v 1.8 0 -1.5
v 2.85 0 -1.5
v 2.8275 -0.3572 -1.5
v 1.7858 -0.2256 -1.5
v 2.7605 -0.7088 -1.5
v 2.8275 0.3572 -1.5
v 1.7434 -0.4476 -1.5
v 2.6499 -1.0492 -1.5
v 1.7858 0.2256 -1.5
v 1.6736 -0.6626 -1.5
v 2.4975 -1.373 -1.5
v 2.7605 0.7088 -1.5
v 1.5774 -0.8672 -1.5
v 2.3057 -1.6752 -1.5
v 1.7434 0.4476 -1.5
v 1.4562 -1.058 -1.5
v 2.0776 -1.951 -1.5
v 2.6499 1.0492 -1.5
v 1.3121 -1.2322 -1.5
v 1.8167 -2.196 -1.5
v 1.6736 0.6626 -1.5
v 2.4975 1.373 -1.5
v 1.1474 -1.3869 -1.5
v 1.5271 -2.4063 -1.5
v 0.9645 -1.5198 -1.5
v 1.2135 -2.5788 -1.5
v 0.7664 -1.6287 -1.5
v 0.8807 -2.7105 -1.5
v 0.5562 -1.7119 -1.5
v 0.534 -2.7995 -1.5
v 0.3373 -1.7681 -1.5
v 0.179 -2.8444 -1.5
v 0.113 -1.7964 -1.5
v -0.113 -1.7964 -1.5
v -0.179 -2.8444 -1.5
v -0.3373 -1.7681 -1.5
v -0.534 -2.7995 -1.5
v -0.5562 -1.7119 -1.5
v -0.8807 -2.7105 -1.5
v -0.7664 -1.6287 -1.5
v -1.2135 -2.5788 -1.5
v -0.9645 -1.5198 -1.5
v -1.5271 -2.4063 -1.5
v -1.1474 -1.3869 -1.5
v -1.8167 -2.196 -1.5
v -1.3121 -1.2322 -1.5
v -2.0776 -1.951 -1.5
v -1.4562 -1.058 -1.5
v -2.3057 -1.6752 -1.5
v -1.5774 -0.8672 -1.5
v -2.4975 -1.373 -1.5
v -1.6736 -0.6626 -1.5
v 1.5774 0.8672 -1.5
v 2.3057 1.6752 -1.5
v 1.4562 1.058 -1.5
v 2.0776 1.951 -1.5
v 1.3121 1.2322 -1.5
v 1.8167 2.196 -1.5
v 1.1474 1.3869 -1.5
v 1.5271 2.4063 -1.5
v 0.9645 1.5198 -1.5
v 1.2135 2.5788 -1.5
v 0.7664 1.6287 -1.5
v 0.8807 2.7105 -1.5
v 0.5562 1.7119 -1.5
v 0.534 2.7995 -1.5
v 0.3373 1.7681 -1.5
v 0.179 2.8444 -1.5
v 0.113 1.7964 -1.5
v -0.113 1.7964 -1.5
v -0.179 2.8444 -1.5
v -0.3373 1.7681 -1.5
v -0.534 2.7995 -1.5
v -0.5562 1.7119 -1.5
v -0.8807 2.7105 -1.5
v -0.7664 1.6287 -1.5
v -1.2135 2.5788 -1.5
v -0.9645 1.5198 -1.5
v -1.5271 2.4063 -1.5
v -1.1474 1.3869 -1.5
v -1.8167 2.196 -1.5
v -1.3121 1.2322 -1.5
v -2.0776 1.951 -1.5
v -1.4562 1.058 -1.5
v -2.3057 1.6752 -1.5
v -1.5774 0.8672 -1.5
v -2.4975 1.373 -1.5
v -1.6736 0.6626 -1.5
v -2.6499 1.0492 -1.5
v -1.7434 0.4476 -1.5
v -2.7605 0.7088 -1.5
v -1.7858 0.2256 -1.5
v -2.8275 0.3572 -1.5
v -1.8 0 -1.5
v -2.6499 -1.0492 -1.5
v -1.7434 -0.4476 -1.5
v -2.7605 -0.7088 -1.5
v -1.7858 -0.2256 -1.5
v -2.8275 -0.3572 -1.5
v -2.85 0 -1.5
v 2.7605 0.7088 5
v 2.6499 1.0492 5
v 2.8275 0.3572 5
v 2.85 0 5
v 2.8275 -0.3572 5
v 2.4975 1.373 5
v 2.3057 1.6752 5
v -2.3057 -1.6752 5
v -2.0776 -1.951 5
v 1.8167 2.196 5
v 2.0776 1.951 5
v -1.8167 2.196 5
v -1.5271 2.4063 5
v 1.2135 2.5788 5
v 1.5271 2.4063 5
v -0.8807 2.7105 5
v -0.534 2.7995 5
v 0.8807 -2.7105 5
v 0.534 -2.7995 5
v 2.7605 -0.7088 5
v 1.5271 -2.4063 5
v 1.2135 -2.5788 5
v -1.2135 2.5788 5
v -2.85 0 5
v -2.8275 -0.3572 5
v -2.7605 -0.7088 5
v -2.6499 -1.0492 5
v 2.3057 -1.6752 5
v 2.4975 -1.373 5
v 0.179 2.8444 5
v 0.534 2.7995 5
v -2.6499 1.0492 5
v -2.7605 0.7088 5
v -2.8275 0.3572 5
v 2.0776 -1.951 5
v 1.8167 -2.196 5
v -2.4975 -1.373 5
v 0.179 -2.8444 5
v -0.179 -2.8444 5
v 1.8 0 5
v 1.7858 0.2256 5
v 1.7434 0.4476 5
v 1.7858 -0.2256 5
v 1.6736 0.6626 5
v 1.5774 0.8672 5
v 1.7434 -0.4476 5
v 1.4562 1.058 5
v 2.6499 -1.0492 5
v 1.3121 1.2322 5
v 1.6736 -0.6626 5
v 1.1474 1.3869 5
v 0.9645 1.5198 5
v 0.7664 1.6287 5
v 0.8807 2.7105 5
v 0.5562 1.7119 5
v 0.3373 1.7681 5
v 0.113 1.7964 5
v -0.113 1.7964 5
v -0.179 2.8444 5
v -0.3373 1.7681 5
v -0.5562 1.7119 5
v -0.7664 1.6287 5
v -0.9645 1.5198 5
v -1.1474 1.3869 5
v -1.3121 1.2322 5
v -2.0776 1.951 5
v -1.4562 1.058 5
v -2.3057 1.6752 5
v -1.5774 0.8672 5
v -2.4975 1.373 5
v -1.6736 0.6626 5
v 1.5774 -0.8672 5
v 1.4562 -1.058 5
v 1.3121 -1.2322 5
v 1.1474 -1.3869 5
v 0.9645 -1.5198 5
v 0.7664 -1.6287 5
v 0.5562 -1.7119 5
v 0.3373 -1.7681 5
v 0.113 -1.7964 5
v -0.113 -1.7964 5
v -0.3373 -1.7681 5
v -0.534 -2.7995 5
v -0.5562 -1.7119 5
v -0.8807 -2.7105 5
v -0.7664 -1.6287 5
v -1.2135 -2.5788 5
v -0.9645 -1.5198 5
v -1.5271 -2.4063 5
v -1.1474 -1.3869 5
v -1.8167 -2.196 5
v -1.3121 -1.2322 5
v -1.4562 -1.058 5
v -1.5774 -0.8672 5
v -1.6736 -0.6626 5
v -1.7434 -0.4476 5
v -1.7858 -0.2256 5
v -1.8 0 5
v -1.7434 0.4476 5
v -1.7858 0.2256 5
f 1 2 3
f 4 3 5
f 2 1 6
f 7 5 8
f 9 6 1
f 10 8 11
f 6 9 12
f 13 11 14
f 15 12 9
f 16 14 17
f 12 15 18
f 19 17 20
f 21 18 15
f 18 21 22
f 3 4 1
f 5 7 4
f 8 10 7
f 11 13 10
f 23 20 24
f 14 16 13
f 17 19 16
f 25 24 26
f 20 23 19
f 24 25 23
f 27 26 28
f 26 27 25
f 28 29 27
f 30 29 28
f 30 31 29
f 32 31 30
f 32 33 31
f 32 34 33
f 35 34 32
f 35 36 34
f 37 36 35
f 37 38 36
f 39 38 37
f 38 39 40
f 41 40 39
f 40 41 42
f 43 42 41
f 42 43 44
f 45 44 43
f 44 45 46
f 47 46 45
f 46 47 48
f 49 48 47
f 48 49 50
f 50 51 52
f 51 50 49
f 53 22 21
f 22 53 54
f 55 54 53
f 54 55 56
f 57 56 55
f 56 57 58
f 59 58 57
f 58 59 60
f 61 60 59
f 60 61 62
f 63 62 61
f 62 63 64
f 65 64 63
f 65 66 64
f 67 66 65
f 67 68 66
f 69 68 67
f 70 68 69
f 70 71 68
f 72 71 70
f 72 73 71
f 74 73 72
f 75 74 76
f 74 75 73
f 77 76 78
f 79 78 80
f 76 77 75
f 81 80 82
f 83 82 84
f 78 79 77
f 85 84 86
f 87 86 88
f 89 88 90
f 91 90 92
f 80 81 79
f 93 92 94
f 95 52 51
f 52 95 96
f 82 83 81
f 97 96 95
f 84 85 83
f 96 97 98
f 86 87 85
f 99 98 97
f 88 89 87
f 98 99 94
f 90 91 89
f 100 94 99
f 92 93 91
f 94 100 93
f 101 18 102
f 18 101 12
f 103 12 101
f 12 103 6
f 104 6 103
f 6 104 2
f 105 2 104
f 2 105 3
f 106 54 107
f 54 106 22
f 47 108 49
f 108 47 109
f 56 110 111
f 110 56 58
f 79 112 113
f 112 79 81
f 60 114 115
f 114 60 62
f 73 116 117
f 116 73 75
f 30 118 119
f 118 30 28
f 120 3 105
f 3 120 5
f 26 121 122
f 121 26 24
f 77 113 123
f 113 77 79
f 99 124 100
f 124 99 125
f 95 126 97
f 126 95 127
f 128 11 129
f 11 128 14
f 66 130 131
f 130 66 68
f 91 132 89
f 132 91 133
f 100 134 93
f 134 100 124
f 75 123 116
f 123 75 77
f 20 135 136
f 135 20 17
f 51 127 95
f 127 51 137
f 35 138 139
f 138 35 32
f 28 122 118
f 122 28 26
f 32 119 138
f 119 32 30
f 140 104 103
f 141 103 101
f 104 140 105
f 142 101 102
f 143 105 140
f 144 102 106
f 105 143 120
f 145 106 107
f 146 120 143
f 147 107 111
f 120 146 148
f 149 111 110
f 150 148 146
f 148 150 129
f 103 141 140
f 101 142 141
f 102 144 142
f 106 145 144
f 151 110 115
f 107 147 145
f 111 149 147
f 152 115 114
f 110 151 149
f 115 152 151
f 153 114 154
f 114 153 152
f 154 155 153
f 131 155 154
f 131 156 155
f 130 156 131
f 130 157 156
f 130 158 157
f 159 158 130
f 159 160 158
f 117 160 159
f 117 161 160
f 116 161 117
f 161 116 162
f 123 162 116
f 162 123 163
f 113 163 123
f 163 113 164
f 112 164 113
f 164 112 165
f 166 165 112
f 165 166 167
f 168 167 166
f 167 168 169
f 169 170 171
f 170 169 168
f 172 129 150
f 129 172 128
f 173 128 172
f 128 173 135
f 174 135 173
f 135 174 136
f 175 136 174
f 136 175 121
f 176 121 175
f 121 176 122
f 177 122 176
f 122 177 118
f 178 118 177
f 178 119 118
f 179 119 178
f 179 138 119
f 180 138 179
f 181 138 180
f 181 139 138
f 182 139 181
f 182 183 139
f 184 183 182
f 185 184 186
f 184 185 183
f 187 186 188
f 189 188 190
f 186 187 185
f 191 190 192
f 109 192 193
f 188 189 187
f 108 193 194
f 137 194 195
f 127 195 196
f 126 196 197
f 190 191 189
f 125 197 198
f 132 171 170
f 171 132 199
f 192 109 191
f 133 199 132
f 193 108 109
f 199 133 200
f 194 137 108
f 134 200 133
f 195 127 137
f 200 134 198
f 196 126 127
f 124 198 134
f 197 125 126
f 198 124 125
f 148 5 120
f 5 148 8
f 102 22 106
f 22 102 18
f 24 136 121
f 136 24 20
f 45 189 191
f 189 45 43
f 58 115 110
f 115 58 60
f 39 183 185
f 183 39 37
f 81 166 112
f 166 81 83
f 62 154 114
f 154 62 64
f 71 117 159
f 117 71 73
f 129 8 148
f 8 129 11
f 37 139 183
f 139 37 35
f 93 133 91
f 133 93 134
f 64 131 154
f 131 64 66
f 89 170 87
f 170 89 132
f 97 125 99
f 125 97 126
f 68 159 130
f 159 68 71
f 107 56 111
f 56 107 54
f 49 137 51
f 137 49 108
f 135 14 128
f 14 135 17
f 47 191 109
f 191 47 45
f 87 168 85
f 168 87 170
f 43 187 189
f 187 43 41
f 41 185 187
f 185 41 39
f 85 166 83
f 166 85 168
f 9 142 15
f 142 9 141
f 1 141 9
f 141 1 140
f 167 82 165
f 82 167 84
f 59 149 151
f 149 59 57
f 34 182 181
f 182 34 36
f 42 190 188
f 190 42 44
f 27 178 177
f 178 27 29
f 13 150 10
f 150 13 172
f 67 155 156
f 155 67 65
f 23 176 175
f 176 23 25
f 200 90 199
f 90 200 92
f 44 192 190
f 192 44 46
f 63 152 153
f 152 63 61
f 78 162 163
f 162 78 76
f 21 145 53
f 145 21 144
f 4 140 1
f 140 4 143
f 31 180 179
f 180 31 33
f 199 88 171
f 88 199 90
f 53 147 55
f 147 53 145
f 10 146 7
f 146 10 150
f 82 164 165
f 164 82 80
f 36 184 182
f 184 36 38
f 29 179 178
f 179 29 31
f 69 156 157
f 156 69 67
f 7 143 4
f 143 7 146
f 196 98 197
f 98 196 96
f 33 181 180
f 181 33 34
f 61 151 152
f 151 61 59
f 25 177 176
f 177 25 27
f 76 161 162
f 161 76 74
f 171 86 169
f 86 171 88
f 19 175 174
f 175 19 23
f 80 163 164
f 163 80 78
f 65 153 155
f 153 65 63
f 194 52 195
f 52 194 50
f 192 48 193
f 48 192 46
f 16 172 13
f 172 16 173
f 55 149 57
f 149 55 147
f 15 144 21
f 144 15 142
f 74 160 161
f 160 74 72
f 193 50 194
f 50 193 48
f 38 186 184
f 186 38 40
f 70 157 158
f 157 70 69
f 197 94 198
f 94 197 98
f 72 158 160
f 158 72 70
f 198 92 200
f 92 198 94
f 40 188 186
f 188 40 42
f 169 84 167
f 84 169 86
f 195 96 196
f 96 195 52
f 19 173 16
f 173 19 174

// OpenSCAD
$fn = 50;


difference() {
	union() {
		translate(v = [0, 0, -1.5000000000]) {
			cylinder(h = 3, r = 1.0000000000);
		}
		translate(v = [0, 0, -1.5000000000]) {
			cylinder(h = 6.5000000000, r = 2.8500000000);
		}
	}
	union() {
		translate(v = [0, 0, -100.0000000000]) {
			cylinder(h = 200, r = 1.8000000000);
		}
	}
}
